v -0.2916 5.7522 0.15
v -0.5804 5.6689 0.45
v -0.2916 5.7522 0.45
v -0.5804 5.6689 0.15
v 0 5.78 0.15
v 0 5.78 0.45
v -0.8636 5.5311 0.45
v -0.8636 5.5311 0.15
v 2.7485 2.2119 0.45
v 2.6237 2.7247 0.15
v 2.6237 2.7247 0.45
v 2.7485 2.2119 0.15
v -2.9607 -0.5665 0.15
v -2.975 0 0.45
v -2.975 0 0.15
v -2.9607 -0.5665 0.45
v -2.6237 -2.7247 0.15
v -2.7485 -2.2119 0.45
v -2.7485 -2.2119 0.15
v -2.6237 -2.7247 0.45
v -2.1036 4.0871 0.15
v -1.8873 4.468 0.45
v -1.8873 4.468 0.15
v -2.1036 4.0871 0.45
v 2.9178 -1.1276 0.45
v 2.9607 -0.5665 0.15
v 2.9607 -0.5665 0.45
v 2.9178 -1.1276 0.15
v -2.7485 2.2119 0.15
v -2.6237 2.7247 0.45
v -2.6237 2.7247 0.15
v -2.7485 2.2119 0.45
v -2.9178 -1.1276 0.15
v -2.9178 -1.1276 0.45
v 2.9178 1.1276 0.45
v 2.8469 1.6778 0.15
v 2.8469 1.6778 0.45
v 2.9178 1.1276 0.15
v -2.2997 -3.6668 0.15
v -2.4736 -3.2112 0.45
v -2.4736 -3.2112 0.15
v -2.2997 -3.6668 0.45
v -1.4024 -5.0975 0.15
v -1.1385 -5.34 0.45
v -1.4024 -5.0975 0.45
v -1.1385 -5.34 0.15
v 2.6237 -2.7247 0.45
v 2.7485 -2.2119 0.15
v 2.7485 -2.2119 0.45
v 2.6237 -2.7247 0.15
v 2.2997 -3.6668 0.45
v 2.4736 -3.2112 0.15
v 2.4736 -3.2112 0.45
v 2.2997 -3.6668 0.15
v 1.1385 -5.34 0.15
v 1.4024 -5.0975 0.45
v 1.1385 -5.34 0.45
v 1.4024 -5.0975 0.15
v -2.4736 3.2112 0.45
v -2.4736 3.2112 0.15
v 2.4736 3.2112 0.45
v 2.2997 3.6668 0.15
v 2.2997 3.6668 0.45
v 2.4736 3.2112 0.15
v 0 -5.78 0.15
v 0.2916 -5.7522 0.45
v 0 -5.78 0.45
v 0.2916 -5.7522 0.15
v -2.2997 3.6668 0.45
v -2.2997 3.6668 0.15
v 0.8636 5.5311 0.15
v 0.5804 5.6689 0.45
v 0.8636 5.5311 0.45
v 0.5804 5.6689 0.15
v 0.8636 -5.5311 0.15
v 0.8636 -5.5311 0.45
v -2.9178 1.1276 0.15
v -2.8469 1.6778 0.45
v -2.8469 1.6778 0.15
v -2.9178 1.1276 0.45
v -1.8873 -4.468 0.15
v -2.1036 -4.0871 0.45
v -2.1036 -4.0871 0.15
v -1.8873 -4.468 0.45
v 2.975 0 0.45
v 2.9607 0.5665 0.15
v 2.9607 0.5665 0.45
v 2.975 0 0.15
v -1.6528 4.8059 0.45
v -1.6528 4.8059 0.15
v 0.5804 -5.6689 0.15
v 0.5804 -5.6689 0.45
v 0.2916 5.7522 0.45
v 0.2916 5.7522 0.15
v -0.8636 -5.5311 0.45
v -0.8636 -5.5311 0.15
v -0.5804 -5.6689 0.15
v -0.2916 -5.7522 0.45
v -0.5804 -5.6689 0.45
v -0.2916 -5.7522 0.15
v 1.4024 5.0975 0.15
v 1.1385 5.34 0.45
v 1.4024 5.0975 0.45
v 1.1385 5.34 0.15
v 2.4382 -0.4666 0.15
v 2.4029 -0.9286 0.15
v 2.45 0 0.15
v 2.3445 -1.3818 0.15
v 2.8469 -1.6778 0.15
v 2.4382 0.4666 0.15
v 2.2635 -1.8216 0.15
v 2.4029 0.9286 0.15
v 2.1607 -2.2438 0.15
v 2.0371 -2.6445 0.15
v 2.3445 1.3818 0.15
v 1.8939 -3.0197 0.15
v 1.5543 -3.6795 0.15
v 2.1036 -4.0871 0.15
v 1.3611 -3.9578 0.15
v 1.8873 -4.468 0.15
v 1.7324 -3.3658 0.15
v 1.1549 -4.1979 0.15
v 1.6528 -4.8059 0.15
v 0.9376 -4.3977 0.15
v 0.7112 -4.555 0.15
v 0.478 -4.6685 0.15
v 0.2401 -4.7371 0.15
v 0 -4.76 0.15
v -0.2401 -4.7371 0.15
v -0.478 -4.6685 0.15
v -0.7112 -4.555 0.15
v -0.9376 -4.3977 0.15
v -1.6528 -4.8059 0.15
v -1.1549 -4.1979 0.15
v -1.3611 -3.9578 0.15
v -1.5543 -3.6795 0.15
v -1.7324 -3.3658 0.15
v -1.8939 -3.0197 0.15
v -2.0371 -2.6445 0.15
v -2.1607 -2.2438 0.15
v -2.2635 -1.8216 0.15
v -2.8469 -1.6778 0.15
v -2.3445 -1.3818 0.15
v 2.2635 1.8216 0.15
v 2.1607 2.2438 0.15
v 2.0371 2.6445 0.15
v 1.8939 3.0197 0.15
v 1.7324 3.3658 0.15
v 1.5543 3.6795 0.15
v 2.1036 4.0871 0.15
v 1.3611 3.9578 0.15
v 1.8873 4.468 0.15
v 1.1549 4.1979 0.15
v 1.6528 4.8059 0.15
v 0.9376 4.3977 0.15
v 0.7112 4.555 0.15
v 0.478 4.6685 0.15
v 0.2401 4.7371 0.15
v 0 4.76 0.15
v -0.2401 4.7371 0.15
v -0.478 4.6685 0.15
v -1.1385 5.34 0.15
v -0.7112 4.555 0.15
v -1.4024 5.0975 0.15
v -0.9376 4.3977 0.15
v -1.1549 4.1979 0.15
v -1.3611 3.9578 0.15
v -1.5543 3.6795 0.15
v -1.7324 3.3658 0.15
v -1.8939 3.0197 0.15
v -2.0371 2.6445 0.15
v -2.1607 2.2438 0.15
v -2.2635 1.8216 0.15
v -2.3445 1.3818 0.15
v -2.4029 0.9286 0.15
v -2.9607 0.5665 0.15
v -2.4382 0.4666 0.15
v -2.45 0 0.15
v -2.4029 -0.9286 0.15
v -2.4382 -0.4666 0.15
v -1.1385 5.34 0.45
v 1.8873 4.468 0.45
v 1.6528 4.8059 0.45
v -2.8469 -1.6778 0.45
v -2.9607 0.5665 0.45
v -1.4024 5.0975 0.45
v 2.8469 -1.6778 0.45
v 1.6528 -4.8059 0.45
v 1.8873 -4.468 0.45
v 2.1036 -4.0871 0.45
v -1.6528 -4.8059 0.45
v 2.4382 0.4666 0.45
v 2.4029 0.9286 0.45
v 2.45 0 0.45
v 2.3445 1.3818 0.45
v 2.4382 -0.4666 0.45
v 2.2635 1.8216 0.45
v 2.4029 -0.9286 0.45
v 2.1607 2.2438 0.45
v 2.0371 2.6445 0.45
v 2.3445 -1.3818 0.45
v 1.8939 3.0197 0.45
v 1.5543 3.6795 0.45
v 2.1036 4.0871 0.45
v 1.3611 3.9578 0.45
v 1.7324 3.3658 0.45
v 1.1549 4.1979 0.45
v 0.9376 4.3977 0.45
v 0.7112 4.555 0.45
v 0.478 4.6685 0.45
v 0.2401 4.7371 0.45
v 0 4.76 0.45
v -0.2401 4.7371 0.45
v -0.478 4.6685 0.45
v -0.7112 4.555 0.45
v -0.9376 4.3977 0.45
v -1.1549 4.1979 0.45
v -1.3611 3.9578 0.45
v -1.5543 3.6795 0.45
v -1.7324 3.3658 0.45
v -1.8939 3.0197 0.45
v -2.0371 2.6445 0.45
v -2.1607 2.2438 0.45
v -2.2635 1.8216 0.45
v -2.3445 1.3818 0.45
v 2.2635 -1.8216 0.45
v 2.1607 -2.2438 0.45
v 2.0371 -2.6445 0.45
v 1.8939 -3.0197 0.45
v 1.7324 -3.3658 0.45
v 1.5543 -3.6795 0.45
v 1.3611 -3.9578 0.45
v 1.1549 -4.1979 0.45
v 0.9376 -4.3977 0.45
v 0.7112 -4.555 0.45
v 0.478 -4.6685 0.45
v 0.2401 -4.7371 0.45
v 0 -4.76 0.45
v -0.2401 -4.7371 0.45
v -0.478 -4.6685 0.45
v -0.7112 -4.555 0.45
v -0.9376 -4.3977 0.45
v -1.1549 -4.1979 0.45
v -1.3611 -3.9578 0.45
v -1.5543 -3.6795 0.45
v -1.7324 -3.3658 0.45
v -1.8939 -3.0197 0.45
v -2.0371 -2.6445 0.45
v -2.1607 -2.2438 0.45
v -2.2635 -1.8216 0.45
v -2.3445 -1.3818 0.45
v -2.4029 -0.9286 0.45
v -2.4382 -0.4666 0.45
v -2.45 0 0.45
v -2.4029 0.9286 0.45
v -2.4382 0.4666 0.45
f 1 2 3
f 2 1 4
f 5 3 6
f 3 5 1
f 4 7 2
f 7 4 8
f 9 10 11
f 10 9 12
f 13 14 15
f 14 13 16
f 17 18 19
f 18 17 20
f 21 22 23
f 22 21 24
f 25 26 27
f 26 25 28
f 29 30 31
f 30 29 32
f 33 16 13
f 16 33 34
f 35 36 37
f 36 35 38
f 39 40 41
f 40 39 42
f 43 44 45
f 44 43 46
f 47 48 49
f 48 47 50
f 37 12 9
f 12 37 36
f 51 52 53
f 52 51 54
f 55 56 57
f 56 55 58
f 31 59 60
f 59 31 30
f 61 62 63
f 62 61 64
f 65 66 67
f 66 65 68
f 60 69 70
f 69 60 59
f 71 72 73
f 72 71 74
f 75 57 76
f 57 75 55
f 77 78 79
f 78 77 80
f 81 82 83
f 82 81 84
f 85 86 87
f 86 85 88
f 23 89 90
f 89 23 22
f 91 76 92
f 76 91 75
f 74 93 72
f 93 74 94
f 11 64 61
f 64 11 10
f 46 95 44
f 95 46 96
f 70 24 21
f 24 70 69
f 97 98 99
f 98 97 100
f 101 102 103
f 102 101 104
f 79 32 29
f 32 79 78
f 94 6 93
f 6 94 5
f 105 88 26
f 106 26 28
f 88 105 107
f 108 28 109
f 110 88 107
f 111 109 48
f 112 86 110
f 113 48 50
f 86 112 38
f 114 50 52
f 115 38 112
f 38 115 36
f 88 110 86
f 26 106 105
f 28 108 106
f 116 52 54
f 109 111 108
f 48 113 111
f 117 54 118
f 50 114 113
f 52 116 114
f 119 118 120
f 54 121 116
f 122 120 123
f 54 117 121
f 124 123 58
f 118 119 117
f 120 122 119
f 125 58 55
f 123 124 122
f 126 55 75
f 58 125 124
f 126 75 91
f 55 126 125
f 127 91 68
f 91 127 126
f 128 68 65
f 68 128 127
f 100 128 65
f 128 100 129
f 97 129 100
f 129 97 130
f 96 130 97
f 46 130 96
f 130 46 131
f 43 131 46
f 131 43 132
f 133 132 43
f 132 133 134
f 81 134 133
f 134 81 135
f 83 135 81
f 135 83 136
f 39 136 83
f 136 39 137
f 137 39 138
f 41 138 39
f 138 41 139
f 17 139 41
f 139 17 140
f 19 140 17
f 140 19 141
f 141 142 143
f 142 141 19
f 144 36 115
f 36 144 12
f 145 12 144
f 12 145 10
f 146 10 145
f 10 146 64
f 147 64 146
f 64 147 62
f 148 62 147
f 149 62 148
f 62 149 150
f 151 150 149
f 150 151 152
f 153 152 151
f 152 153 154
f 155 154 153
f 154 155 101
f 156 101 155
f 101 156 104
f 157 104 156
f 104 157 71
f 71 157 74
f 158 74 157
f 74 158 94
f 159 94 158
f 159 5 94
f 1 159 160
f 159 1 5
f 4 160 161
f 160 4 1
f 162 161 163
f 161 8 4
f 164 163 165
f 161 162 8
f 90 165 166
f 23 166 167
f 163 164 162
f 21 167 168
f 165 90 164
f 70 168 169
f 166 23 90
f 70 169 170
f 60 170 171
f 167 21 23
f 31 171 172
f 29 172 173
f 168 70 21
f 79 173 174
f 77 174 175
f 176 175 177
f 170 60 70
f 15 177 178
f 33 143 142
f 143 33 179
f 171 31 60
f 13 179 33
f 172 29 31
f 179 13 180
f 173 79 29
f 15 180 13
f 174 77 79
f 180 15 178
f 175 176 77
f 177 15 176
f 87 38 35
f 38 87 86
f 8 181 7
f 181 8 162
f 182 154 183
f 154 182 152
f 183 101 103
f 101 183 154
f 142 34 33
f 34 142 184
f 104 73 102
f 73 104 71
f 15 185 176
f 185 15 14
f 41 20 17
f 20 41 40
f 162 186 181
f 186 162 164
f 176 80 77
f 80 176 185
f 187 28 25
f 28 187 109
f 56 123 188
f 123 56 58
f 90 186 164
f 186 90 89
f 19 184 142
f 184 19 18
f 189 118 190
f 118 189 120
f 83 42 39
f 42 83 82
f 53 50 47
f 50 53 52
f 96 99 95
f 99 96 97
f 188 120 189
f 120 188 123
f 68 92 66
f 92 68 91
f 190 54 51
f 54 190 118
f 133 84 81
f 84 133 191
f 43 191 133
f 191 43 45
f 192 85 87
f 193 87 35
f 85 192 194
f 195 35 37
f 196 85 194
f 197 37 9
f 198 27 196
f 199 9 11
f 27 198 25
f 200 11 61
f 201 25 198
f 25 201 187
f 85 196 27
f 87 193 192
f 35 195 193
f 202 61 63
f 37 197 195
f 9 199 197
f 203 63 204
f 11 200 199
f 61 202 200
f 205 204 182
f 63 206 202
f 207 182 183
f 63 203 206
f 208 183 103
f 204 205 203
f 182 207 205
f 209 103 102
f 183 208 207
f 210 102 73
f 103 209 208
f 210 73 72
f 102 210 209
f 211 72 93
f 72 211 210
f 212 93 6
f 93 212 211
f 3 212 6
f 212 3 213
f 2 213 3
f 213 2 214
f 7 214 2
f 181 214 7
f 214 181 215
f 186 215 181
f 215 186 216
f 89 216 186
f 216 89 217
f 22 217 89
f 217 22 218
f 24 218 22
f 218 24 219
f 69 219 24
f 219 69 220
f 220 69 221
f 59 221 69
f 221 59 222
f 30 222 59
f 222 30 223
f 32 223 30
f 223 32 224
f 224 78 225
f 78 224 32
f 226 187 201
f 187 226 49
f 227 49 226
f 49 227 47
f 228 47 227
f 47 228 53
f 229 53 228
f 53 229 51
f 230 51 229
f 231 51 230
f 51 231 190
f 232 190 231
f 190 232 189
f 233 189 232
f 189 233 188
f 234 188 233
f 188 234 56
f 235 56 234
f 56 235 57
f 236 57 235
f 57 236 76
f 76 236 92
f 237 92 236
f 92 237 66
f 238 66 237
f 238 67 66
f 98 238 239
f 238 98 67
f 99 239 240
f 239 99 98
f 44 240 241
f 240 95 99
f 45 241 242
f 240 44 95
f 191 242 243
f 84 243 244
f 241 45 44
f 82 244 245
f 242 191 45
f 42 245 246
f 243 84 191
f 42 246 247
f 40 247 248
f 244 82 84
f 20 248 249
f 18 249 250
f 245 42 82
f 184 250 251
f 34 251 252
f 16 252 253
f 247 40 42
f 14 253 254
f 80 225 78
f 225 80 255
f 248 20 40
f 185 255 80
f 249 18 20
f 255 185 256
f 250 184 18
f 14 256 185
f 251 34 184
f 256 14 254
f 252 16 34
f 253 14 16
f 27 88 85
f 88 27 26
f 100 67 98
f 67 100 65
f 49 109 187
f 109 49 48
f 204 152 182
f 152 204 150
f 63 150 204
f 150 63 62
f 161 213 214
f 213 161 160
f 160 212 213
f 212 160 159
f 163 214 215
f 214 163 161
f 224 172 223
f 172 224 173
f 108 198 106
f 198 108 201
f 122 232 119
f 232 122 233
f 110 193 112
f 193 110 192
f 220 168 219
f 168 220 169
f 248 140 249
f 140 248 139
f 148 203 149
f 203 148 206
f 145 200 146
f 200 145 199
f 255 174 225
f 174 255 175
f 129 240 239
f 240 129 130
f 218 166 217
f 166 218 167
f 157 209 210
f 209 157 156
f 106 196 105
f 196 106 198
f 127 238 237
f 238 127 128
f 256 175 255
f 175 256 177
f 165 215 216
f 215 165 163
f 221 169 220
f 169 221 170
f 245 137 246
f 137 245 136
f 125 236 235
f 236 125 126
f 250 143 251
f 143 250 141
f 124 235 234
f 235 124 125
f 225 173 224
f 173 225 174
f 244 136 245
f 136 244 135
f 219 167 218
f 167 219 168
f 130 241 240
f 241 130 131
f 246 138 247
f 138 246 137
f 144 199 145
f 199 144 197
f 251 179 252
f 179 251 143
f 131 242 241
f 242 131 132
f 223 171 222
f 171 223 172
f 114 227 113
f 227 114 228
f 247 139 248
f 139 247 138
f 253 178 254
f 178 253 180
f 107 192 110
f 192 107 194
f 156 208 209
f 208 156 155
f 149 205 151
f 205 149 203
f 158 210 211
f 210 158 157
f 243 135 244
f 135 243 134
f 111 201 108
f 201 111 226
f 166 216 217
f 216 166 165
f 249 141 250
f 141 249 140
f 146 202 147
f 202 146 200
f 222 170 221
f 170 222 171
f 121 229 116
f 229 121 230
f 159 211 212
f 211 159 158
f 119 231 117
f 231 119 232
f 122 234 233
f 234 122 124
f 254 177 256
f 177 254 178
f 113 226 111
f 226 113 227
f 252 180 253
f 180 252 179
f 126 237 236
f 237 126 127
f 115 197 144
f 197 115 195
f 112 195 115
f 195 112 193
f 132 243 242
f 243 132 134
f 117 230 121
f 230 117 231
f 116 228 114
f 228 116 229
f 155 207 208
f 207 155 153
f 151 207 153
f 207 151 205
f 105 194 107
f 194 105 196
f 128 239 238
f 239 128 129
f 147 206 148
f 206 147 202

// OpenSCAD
module axial() {
    difference() {
        cylinder(h = 0.3, r1 = 1.7, r2 = 1.7, $fn = 64);
        translate([0, 0, -0.1])
            cylinder(h = 0.5, r1 = 1.4, r2 = 1.4, $fn = 64);
    }
}

translate([0, 0, 0.15])
    rotate([0, 0, 90])
        scale([3.4, 1.75, 1])
            axial();
